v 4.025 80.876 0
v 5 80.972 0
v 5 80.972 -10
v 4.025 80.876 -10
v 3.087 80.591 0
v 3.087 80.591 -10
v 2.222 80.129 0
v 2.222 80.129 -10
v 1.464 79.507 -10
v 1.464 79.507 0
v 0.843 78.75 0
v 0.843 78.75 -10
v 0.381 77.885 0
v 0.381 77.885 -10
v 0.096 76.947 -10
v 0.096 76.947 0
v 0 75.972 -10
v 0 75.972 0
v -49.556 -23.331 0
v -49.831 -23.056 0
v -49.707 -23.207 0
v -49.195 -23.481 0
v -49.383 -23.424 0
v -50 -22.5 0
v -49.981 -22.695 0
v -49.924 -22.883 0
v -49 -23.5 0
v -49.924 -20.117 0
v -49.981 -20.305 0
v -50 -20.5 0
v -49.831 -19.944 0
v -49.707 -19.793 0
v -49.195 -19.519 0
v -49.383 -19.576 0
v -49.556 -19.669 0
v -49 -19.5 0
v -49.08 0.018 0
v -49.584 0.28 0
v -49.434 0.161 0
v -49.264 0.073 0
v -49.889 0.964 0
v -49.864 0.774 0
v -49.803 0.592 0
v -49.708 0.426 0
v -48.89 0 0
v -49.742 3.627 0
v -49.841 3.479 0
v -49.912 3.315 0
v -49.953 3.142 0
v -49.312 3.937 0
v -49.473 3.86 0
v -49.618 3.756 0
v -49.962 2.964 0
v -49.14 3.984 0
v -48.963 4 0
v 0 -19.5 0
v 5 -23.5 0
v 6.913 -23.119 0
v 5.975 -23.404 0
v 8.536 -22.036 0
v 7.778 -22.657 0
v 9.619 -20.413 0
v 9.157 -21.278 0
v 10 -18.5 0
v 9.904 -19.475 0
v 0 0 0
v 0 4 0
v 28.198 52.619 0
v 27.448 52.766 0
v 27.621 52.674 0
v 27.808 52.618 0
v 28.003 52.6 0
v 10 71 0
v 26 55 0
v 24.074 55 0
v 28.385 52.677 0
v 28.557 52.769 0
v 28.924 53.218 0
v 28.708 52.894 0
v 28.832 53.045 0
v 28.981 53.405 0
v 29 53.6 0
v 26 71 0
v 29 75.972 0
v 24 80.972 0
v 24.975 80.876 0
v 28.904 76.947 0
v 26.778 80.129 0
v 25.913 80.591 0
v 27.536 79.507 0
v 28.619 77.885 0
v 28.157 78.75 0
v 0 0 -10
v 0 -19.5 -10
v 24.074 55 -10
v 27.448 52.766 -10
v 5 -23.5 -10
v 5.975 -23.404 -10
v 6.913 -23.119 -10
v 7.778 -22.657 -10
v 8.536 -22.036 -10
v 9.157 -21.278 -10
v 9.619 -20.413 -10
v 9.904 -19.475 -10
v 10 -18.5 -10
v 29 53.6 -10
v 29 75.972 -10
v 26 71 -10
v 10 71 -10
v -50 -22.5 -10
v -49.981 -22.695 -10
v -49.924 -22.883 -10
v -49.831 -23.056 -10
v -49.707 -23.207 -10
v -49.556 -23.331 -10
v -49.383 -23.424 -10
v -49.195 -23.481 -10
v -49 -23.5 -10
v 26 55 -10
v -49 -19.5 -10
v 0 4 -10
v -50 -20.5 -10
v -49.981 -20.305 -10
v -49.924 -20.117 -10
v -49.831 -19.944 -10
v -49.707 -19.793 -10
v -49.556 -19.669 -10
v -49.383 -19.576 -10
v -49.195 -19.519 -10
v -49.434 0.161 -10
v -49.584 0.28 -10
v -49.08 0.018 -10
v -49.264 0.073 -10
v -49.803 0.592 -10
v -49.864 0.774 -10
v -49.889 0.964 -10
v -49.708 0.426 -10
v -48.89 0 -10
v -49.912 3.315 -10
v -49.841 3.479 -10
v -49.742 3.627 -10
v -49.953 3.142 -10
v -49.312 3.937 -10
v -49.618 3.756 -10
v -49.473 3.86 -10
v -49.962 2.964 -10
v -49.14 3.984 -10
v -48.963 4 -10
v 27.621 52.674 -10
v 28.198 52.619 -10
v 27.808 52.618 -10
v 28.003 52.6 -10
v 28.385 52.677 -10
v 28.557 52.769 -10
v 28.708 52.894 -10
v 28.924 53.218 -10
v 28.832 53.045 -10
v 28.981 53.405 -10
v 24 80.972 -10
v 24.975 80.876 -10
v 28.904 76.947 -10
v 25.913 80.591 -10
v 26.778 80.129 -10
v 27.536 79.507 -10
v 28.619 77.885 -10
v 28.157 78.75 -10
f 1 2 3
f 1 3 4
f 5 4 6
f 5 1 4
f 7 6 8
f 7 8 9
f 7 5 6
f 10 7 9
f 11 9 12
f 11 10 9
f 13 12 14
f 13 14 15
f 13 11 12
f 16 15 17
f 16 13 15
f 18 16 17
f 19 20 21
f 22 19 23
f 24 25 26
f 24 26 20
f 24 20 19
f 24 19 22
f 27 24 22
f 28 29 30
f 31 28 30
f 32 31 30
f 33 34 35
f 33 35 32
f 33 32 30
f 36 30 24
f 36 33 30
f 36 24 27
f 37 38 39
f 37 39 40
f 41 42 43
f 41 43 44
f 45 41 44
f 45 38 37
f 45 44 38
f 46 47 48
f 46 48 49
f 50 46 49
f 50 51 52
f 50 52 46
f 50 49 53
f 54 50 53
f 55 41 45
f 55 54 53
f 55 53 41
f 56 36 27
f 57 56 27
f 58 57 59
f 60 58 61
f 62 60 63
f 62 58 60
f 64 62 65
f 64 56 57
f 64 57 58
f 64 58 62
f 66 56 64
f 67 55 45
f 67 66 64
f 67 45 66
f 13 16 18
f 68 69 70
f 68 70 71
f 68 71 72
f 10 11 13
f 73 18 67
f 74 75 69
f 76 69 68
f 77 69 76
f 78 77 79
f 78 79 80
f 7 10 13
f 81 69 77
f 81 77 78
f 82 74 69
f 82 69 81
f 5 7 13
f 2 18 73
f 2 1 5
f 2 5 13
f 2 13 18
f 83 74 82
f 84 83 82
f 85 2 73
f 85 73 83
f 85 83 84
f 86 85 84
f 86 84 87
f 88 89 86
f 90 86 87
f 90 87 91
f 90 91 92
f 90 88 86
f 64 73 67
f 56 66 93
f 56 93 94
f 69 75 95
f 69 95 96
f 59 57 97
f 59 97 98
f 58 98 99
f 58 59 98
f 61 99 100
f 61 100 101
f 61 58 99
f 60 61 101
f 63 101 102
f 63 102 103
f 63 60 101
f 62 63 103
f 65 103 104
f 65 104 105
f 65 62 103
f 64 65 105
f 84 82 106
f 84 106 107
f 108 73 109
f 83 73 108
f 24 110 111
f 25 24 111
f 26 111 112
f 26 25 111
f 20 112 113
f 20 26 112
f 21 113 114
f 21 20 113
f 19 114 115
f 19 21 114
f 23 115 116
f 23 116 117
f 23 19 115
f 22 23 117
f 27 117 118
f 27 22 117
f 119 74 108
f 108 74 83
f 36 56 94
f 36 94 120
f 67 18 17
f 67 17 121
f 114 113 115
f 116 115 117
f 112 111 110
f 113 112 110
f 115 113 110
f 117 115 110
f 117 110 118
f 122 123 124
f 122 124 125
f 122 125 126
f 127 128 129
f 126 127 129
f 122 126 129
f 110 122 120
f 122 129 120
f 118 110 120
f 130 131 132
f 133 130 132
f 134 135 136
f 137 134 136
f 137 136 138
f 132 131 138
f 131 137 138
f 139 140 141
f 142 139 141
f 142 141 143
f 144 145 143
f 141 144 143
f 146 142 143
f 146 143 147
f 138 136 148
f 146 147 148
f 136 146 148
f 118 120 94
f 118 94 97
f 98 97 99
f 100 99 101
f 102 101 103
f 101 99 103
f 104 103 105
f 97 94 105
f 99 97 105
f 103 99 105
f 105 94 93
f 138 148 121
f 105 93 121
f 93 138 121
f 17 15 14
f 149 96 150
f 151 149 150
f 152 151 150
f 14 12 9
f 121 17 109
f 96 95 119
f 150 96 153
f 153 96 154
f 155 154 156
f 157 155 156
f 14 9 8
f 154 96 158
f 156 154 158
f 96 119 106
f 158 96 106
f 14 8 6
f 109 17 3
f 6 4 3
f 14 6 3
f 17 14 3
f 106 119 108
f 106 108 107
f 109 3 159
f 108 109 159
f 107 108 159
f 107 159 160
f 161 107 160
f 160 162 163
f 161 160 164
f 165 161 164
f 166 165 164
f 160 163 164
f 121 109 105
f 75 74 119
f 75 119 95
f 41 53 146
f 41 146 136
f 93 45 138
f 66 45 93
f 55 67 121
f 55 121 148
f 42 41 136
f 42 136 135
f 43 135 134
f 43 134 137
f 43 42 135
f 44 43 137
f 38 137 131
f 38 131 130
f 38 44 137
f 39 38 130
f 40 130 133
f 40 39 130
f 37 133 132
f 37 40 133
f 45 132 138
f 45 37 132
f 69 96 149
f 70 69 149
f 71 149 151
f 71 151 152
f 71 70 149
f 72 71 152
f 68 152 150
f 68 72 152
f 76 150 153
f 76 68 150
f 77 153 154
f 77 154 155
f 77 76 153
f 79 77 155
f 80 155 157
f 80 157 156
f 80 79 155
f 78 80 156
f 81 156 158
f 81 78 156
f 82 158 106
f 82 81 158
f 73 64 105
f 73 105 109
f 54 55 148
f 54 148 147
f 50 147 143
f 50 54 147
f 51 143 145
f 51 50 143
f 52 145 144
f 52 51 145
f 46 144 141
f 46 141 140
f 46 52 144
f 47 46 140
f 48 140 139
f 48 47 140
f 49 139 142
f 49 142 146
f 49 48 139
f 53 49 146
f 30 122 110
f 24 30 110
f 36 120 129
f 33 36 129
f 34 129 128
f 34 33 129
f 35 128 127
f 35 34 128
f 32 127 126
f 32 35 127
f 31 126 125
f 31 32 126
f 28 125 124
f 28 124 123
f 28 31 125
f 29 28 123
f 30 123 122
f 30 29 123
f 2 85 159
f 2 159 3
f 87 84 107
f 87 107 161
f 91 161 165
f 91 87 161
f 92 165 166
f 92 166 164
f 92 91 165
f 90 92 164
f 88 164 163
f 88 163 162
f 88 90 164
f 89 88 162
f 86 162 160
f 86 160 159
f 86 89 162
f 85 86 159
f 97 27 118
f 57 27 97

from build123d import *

# Parameters (mm, degrees)
F0_W     = 3
F0_H     = 16
F1_DEPTH = 10


with BuildPart() as f1:
    # F0 (on Top) → F1 (new body)
    with BuildSketch(Plane.XY):
        with BuildLine():
            Line((0, -23.5), (0, -19.5))
            Line((0, -19.5), (-49, -19.5))
            ThreePointArc((-49, -19.5), (-49.707107, -19.792893), (-50, -20.5))
            Line((-50, -20.5), (-50, -22.5))
            ThreePointArc((-50, -22.5), (-49.707107, -23.207107), (-49, -23.5))
            Line((-49, -23.5), (0, -23.5))
        make_face()
        with BuildLine():
            Line((0, 4), (0, 0))
            Line((0, 0), (0, -19.5))
            Line((0, -19.5), (0, -23.5))
            Line((0, -23.5), (5, -23.5))
            ThreePointArc((5, -23.5), (8.535534, -22.035534), (10, -18.5))
            Line((10, -18.5), (10, 71))
            Line((10, 71), (26, 71))
            Line((26, 71), (29, 71))
            Line((29, 71), (29, 75.97183))
            ThreePointArc((29, 75.97183), (27.535534, 79.507364), (24, 80.97183))
            Line((24, 80.97183), (5, 80.97183))
            ThreePointArc((5, 80.97183), (1.464466, 79.507364), (0, 75.97183))
            Line((0, 75.97183), (0, 4))
        make_face()
        with Locations((27.5, 63)):
            Rectangle(F0_W, F0_H)
        with BuildLine():
            Line((-48.889865, 0), (0, 0))
            Line((0, 0), (0, 4))
            Line((0, 4), (-48.962844, 4))
            ThreePointArc((-48.962844, 4), (-49.682728, 3.694094), (-49.962179, 2.963534))
            Line((-49.962179, 2.963534), (-49.889199, 0.963534))
            ThreePointArc((-49.889199, 0.963534), (-49.583959, 0.280116), (-48.889865, 0))
        make_face()
        with BuildLine():
            Line((29, 53.599753), (29, 55))
            Line((29, 55), (26, 55))
            Line((26, 55), (24.074446, 55))
            Line((24.074446, 55), (27.447859, 52.766002))
            ThreePointArc((27.447859, 52.766002), (28.473212, 52.718804), (29, 53.599753))
        make_face()
    extrude(amount=-F1_DEPTH)


solid = f1.part
